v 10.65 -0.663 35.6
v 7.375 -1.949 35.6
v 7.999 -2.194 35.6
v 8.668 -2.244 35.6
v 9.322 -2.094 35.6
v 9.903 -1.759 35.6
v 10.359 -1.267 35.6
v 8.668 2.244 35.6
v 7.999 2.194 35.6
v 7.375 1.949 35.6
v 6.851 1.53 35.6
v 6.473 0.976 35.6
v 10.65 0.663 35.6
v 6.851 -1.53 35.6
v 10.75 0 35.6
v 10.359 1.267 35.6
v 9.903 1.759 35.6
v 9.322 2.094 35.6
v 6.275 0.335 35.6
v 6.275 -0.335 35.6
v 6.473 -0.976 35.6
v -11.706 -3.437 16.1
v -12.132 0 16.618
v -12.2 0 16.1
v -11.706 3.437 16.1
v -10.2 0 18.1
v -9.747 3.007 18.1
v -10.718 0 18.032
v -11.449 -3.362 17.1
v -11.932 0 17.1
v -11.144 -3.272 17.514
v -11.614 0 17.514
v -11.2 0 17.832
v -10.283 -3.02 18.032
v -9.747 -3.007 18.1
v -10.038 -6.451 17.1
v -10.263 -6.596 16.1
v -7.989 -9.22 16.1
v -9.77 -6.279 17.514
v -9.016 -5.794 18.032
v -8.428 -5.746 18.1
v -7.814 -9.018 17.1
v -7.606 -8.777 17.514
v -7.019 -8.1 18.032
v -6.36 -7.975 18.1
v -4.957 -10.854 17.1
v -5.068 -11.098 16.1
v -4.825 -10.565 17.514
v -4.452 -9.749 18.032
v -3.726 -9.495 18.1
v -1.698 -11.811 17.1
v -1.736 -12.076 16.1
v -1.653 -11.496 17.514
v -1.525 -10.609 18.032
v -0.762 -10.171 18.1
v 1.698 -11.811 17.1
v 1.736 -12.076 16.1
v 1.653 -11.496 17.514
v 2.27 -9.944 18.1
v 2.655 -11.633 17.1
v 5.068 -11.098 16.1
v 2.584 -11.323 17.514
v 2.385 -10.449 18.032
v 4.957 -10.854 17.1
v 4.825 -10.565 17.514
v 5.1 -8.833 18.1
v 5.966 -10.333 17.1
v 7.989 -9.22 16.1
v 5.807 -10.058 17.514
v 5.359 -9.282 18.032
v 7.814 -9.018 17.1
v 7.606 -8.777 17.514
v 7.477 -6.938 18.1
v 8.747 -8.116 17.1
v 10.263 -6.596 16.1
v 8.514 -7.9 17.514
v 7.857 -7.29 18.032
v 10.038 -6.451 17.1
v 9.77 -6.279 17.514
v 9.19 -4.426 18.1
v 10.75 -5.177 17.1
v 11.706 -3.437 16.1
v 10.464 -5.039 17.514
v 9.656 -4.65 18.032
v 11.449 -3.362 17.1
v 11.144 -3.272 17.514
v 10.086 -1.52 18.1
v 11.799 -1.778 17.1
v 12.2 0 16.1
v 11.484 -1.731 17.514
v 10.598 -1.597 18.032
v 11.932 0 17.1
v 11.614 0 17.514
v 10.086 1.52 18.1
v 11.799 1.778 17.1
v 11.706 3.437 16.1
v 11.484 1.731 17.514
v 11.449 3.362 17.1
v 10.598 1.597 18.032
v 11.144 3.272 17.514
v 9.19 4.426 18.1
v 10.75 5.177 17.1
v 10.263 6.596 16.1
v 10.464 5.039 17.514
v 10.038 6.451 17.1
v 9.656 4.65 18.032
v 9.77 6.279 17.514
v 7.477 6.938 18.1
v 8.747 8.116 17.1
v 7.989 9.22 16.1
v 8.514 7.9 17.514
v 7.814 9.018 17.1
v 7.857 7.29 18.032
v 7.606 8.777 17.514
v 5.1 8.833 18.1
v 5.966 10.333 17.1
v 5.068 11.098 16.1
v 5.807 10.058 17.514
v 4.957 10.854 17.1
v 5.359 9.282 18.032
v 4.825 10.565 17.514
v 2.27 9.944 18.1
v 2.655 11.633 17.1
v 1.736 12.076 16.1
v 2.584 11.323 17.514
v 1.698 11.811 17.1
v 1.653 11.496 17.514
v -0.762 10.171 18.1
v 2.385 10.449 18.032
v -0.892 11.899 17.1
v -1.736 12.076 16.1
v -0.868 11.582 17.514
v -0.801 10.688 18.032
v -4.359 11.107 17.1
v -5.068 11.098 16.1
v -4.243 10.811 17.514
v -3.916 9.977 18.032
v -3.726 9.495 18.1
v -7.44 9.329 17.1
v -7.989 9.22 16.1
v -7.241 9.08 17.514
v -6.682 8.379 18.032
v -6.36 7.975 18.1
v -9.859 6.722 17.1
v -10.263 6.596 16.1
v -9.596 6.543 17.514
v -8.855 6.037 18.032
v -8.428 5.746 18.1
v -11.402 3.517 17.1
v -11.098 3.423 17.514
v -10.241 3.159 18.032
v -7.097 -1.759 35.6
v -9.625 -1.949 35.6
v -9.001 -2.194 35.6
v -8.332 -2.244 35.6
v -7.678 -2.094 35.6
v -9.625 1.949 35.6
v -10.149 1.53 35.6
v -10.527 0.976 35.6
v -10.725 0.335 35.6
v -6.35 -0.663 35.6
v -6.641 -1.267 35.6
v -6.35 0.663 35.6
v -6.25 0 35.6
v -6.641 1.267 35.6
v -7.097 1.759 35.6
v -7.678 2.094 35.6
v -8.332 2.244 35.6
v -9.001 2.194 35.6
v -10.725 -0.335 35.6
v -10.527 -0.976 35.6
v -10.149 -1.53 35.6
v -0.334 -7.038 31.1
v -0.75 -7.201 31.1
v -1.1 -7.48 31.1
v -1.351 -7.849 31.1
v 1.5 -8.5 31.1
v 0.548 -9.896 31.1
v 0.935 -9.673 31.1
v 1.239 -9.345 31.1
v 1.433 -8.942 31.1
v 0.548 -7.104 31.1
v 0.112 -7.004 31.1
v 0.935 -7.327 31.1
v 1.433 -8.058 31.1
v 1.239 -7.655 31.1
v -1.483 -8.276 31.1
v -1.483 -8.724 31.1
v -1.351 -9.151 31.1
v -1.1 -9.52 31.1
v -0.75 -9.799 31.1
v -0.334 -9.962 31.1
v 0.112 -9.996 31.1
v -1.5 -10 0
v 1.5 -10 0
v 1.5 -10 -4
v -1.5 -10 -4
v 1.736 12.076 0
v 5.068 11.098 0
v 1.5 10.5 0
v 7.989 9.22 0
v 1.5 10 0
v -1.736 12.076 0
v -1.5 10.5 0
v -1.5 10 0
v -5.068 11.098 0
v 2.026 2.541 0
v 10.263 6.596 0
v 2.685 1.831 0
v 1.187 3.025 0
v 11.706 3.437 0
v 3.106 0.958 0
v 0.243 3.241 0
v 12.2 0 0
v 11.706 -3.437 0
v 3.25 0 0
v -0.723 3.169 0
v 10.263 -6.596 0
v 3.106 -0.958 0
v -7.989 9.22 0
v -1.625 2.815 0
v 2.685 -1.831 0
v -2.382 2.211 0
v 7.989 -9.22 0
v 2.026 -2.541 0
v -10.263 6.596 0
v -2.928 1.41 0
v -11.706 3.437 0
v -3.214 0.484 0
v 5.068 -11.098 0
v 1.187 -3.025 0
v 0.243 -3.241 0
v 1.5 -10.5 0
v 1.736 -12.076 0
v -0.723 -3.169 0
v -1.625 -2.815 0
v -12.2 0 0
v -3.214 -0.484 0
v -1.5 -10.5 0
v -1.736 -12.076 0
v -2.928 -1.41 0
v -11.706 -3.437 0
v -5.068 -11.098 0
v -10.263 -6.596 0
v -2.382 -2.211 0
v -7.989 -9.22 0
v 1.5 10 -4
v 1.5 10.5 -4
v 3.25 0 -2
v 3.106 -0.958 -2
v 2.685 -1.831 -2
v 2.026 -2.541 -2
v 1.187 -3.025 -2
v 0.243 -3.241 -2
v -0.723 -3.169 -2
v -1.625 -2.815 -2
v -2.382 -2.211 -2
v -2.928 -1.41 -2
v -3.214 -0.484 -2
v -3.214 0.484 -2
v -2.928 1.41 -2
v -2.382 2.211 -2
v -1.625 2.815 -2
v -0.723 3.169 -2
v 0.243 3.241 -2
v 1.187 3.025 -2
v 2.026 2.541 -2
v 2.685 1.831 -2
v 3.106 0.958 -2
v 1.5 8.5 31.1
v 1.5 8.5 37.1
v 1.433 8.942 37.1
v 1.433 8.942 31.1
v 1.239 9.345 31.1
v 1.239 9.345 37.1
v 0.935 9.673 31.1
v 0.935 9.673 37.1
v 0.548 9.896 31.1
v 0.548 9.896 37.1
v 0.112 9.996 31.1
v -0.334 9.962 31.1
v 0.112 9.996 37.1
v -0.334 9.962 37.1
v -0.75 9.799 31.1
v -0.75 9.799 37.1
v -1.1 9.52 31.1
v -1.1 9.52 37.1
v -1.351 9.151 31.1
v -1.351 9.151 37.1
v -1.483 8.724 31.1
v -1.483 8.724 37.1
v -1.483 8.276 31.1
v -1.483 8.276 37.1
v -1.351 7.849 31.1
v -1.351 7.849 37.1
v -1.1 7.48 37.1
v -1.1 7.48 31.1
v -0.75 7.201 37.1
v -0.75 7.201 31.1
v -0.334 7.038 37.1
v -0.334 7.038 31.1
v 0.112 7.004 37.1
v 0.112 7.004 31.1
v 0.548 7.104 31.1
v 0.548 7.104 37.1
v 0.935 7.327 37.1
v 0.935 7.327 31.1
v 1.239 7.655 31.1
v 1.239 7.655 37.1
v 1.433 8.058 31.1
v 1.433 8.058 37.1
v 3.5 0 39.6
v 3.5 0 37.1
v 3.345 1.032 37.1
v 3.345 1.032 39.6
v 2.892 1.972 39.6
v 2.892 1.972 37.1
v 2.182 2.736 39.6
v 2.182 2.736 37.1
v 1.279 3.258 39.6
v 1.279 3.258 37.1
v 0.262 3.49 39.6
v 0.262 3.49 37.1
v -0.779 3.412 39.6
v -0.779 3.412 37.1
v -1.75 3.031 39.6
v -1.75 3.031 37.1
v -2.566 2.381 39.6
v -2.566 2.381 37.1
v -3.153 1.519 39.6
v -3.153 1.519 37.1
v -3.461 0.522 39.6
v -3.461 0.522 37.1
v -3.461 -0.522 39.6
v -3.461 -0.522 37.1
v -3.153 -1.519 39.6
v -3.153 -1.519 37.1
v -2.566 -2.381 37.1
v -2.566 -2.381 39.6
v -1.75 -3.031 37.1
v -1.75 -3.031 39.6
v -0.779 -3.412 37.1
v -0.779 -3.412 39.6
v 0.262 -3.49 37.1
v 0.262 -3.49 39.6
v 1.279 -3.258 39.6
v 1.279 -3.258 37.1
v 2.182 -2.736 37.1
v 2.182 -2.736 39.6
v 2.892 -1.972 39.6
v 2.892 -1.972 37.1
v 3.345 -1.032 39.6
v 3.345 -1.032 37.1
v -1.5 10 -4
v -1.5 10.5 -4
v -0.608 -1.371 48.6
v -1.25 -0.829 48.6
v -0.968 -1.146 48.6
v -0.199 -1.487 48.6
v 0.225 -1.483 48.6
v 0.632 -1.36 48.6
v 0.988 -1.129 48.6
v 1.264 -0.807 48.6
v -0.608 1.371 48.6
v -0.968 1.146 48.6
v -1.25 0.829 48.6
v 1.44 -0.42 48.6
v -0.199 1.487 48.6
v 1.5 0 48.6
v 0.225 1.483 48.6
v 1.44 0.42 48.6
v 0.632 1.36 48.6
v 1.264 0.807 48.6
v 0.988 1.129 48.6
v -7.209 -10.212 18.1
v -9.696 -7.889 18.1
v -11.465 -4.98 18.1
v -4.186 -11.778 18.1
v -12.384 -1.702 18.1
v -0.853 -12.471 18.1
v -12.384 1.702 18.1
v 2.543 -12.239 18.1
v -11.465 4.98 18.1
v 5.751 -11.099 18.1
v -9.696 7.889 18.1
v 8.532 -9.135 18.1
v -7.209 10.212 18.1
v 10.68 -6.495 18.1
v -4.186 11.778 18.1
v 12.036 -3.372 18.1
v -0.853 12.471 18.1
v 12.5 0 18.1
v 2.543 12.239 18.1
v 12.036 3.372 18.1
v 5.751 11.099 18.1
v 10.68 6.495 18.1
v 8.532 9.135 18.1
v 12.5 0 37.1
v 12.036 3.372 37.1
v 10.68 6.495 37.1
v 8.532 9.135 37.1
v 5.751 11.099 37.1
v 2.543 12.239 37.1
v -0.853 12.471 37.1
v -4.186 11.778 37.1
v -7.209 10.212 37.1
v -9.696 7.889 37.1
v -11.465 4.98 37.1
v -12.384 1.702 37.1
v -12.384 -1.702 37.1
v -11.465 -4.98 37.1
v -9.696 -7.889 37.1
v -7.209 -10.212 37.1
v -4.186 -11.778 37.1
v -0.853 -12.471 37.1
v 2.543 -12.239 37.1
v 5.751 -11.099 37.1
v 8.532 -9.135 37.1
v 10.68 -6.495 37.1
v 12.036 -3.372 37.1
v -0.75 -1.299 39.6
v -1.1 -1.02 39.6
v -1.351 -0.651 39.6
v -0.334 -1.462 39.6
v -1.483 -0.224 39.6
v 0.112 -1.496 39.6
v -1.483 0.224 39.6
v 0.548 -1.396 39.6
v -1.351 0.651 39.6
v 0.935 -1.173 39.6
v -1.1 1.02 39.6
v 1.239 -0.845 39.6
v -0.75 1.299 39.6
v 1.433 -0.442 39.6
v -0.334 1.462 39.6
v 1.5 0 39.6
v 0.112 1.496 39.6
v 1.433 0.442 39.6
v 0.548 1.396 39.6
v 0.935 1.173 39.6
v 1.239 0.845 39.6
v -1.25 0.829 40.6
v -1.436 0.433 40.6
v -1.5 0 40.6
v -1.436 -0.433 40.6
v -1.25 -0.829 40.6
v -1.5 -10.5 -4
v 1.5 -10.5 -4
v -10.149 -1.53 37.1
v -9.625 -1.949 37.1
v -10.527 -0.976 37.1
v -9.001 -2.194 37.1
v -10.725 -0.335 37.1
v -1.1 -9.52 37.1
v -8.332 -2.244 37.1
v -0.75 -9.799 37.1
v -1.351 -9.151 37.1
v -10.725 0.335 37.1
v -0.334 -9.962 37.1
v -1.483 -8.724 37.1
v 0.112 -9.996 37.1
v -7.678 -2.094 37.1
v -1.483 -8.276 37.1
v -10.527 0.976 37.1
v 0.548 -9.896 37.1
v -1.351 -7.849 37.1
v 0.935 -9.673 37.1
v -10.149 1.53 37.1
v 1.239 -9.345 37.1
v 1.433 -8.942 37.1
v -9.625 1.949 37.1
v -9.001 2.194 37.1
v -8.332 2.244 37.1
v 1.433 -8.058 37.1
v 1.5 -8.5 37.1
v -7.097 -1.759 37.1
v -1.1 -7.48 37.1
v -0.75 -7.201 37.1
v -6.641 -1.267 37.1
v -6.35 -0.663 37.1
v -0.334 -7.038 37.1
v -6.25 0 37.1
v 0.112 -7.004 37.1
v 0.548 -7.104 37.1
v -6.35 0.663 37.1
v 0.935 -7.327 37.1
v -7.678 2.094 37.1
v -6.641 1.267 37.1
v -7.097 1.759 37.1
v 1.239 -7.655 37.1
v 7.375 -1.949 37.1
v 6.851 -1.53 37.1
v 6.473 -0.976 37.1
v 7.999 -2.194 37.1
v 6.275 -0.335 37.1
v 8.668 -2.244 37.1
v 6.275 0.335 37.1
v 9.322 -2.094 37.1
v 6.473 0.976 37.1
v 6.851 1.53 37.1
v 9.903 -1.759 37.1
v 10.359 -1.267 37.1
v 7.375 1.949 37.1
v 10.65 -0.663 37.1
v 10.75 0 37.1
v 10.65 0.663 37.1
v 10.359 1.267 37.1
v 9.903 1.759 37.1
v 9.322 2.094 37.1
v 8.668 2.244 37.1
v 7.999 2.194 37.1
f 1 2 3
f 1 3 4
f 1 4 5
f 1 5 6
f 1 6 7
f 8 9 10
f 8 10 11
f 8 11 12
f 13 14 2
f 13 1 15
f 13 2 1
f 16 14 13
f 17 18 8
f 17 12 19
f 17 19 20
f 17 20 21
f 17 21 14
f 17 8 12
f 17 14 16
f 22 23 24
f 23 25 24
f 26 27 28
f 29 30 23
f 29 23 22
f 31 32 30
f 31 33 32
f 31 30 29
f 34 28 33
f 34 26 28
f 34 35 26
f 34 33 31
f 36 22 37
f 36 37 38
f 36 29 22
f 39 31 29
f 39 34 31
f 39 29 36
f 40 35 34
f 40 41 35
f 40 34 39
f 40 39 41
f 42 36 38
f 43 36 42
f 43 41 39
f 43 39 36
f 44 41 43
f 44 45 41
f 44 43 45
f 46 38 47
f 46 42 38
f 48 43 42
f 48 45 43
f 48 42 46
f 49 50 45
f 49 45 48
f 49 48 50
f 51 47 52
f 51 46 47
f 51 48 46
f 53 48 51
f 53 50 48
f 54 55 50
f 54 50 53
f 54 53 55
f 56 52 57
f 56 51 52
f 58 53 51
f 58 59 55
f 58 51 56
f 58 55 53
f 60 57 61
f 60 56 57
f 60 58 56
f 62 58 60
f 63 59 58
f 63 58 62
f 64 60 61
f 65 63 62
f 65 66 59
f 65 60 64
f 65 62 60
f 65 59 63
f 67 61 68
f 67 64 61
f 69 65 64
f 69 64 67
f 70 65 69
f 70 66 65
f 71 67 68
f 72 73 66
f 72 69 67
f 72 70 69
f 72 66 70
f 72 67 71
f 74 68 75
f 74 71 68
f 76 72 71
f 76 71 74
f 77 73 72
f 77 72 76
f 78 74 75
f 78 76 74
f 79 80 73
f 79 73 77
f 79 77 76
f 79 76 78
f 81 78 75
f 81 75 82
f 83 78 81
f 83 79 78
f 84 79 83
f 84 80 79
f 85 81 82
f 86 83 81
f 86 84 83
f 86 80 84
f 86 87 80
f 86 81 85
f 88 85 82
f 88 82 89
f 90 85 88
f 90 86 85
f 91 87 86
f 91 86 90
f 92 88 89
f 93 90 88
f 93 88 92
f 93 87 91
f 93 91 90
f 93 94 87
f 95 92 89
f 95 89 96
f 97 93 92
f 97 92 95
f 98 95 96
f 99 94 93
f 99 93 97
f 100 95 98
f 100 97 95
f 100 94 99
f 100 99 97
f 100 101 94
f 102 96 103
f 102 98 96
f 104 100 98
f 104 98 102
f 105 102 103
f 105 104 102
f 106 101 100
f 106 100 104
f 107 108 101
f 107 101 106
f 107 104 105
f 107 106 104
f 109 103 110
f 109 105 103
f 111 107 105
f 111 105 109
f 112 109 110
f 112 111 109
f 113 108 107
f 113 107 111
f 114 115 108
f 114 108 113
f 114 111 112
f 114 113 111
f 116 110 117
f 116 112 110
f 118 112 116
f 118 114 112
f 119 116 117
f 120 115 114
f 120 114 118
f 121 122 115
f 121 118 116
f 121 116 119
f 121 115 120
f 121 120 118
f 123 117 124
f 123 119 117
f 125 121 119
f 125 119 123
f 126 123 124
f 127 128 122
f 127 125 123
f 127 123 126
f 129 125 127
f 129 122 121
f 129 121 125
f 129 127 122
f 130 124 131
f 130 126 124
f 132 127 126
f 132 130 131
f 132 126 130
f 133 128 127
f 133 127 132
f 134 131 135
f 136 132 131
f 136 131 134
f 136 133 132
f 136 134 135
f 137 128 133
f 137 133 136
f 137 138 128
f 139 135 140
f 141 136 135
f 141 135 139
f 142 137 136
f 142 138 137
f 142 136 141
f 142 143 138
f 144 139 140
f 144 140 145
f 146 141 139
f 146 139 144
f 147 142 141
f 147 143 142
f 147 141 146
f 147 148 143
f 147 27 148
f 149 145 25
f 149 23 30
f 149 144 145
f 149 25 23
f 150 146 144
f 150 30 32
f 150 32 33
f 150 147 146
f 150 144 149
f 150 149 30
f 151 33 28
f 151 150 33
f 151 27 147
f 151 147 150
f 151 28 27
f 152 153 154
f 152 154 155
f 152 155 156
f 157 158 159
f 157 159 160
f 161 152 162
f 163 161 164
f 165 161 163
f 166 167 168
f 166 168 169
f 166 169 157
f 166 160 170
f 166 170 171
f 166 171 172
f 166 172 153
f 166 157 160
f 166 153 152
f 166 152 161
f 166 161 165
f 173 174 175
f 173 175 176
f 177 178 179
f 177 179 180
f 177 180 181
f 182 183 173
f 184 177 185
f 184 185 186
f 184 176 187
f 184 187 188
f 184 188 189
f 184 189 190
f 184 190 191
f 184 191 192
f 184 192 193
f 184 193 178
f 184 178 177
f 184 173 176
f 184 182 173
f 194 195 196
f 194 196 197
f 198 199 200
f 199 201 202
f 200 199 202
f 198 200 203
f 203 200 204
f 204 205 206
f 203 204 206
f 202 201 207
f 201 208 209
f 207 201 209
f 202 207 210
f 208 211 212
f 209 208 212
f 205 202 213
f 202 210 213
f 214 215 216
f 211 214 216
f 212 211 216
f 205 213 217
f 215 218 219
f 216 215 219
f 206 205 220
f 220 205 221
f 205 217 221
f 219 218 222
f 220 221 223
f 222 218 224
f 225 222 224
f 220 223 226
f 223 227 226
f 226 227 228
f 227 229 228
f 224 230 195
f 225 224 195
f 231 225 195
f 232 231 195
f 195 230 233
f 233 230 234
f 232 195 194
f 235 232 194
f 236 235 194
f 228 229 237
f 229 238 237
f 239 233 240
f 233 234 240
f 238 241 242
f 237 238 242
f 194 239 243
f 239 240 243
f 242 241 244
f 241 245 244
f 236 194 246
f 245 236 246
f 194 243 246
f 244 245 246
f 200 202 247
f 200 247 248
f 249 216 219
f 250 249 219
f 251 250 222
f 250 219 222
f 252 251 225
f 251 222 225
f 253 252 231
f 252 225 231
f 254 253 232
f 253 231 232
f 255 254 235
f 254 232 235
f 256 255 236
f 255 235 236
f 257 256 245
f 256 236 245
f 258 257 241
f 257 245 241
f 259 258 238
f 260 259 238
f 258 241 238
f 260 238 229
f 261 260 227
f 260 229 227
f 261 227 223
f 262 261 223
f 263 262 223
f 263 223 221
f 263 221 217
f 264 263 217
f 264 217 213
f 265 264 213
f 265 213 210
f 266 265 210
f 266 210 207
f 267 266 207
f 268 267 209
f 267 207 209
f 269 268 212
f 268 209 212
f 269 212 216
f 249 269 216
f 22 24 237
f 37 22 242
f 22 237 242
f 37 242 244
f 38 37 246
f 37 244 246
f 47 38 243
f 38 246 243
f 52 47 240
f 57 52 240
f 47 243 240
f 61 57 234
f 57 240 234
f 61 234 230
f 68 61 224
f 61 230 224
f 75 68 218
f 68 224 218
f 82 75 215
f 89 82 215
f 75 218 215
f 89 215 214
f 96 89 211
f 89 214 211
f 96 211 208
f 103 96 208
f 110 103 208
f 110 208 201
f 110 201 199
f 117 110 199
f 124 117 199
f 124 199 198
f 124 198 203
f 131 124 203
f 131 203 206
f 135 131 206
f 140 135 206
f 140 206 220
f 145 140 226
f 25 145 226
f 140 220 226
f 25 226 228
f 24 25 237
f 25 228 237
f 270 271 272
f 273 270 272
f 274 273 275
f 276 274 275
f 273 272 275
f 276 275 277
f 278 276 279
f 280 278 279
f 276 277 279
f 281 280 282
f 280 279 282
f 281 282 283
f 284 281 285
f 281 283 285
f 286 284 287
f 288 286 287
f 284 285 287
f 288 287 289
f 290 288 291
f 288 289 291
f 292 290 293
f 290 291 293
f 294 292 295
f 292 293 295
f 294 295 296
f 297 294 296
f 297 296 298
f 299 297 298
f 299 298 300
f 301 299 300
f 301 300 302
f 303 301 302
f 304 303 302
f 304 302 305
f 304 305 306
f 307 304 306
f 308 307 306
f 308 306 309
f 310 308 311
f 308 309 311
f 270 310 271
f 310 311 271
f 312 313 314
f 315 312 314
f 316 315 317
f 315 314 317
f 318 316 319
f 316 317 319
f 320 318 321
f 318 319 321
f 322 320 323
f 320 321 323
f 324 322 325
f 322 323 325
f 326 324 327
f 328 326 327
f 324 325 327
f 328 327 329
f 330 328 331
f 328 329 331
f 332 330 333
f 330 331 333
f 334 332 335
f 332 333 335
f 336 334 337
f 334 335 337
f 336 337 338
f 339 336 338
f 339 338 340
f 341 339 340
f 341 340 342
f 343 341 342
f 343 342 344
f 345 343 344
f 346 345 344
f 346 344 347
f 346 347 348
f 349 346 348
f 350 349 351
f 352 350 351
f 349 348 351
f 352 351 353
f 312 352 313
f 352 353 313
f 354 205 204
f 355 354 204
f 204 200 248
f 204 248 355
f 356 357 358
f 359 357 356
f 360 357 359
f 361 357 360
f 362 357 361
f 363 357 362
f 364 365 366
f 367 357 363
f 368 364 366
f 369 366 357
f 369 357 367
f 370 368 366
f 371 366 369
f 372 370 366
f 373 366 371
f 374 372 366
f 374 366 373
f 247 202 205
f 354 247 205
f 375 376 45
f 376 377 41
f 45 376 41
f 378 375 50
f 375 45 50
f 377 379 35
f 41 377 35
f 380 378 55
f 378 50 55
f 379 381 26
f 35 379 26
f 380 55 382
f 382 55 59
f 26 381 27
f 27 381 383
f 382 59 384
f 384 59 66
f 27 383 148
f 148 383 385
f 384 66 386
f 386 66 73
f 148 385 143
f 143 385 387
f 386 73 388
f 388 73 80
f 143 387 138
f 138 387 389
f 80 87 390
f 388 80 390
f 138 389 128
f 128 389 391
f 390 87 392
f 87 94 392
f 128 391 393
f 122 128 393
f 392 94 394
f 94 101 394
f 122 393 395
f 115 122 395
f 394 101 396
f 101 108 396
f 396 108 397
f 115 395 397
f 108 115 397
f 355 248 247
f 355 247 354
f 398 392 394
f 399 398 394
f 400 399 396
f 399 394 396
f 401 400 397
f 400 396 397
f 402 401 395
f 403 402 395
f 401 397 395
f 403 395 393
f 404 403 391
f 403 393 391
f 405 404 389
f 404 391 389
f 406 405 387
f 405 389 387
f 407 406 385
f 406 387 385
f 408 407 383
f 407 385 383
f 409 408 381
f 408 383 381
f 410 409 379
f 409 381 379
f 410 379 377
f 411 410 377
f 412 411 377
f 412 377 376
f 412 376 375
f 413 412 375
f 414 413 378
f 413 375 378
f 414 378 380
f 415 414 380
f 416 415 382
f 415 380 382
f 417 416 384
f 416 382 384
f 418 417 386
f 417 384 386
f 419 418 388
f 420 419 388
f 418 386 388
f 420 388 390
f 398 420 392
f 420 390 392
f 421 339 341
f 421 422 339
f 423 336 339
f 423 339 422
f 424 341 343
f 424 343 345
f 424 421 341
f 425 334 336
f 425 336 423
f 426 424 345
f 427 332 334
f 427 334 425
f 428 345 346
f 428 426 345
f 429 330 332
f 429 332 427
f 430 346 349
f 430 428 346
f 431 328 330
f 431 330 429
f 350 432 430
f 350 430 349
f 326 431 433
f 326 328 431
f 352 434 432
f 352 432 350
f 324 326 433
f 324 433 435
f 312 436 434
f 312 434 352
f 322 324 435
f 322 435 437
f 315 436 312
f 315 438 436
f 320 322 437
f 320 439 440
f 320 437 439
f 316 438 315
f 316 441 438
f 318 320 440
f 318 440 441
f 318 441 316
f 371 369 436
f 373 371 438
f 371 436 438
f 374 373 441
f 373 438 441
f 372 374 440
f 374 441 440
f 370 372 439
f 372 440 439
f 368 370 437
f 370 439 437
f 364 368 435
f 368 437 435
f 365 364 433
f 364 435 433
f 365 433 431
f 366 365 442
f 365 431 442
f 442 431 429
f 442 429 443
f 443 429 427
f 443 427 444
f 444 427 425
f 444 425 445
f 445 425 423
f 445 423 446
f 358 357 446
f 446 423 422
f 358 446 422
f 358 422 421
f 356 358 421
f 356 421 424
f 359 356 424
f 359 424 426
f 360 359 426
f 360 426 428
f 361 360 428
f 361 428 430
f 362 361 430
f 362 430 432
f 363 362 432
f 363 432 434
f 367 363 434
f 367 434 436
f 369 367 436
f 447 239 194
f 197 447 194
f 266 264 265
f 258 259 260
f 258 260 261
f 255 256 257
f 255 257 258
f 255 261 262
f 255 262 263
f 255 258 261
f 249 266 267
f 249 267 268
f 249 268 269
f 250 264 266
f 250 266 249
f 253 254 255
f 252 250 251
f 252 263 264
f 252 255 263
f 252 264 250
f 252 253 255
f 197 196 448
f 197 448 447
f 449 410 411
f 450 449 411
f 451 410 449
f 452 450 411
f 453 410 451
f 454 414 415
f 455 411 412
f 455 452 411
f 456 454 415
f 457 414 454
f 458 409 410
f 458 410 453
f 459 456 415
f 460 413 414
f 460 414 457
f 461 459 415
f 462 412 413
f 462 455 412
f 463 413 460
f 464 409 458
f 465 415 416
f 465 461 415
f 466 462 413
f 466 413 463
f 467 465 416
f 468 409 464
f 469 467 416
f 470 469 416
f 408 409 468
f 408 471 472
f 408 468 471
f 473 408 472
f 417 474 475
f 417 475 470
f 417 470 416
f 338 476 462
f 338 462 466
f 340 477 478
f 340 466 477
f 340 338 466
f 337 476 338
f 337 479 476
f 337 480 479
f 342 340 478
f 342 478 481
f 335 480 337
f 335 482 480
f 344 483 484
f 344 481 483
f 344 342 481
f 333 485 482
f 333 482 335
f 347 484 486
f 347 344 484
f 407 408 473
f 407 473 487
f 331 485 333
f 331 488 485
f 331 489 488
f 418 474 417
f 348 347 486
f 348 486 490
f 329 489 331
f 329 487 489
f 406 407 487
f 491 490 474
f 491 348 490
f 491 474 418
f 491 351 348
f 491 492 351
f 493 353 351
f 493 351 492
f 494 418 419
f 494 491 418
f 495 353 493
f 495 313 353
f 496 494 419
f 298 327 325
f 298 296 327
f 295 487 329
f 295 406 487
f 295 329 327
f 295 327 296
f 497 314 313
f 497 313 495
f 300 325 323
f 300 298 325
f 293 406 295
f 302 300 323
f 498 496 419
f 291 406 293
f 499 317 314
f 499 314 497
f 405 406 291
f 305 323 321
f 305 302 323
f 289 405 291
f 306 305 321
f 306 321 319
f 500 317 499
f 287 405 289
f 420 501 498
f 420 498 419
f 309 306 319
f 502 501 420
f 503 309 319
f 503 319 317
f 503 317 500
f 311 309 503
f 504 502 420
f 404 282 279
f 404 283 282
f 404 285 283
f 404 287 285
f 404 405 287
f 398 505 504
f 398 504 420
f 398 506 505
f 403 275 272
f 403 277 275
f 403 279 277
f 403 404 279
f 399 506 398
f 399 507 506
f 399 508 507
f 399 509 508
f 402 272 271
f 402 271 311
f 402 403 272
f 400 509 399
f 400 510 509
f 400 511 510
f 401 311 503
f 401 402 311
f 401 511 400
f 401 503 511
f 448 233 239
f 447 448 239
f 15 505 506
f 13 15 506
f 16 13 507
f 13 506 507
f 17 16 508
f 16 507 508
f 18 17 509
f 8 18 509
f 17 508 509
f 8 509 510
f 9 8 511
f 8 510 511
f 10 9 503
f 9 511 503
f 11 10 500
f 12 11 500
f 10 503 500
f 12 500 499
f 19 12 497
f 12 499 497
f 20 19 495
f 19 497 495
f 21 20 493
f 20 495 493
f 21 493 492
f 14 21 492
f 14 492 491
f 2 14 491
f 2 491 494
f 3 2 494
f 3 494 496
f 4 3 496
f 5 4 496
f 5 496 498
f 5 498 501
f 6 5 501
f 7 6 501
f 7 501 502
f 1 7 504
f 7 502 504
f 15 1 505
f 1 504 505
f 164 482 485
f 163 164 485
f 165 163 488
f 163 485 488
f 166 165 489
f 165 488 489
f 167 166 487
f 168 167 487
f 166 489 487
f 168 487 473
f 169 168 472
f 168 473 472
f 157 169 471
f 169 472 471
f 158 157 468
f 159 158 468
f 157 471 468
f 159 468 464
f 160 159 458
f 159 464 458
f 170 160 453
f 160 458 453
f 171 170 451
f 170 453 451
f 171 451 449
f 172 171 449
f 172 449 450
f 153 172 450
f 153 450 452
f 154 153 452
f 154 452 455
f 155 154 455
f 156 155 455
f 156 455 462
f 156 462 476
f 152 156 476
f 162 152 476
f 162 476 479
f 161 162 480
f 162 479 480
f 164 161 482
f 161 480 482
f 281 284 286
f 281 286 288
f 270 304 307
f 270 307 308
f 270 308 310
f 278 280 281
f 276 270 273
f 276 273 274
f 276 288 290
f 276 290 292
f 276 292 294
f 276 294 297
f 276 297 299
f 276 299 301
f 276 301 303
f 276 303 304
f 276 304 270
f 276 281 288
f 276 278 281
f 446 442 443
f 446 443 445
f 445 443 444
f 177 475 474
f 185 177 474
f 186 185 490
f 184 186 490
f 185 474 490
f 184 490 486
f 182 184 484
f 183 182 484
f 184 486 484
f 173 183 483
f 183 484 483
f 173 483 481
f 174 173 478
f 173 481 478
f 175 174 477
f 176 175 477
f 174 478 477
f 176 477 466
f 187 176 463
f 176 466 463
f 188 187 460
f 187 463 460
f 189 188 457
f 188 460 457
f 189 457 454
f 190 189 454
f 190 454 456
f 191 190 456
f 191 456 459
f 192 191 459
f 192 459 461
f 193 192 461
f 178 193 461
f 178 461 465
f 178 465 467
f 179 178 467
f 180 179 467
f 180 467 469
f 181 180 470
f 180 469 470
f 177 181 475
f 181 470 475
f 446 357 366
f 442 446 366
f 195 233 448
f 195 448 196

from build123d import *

# Parameters (mm, degrees)
SKETCH_1_R          = 12.2
EXTRUDE_1_DEPTH     = 18.1
FILLET_1_R          = 2
SKETCH_2_R          = 12.5
EXTRUDE_2_DEPTH     = 19
SKETCH_3_R          = 3.5
EXTRUDE_3_DEPTH     = 2.5
SKETCH_4_R          = 1.5
EXTRUDE_4_DEPTH     = 9
CUT_EXTRUDE_1_DEPTH = 8
SKETCH_6_R          = 2.25
CUT_EXTRUDE_2_DEPTH = 1.5
SKETCH_8_R          = 1.5
CUT_EXTRUDE_3_DEPTH = 6
SKETCH_9_R          = 3.25
EXTRUDE_5_DEPTH     = 2
SKETCH_10_W         = 3
SKETCH_10_H         = 0.5
EXTRUDE_6_DEPTH     = 4


with BuildPart() as part:
    # 草图1 → 凸台-拉伸1 (new body)
    with BuildSketch(Plane.XY):
        with Locations(Location((0, 0, 0), (0, 0, 180))):
            Circle(SKETCH_1_R)
    extrude(amount=EXTRUDE_1_DEPTH)

    # 圆角1
    fillet_1_edges = [part.edges().sort_by_distance(p)[0] for p in [
        (12.2, 0, 18.1),
    ]]
    fillet(fillet_1_edges, radius=FILLET_1_R)

    # 草图2 → 凸台-拉伸2 (add)
    with BuildSketch(Plane.XY.offset(18.1)):
        Circle(SKETCH_2_R)
    extrude(amount=EXTRUDE_2_DEPTH)

    # 草图3 → 凸台-拉伸3 (add)
    with BuildSketch(Plane.XY.offset(37.1)):
        Circle(SKETCH_3_R)
    extrude(amount=EXTRUDE_3_DEPTH)

    # 草图4 → 凸台-拉伸4 (add)
    with BuildSketch(Plane.XY.offset(39.6)):
        Circle(SKETCH_4_R)
    extrude(amount=EXTRUDE_4_DEPTH)

    # 草图5 → 切除-拉伸1 (cut)
    with BuildSketch(Plane.XY.offset(48.6)):
        Polygon((-1.25, -49.129490658), (-1.25, -0.829156198), (-1.25, 0.829156198), (-1.25, 49.129490658), (-97.85066892, 49.129490658), (-97.85066892, -49.129490658), align=None)
    extrude(amount=-CUT_EXTRUDE_1_DEPTH, mode=Mode.SUBTRACT)

    # 草图6 → 切除-拉伸2 (cut)
    with BuildSketch(Plane.XY.offset(37.1)):
        with Locations((8.5, 0)):
            Circle(SKETCH_6_R)
        with Locations((-8.5, 0)):
            Circle(SKETCH_6_R)
    extrude(amount=-CUT_EXTRUDE_2_DEPTH, mode=Mode.SUBTRACT)

    # 草图8 → 切除-拉伸3 (cut)
    with BuildSketch(Plane.XY.offset(37.1)):
        with Locations((0, 8.5)):
            Circle(SKETCH_8_R)
        with Locations((0, -8.5)):
            Circle(SKETCH_8_R)
    extrude(amount=-CUT_EXTRUDE_3_DEPTH, mode=Mode.SUBTRACT)

    # 草图9 → 凸台-拉伸5 (add)
    with BuildSketch(Plane(origin=(0, 0, 0), x_dir=(-1, 0, 0), z_dir=(0, 0, -1))):
        with Locations(Location((0, 0, 0), (0, 0, 180))):
            Circle(SKETCH_9_R)
    extrude(amount=EXTRUDE_5_DEPTH)

    # 草图10 → 凸台-拉伸6 (add)
    with BuildSketch(Plane(origin=(0, 0, 0), x_dir=(-1, 0, 0), z_dir=(0, 0, -1))):
        with Locations((0, 10.25)):
            Rectangle(SKETCH_10_W, SKETCH_10_H)
        with Locations((0, -10.25)):
            Rectangle(SKETCH_10_W, SKETCH_10_H)
    extrude(amount=EXTRUDE_6_DEPTH)


solid = part.part
